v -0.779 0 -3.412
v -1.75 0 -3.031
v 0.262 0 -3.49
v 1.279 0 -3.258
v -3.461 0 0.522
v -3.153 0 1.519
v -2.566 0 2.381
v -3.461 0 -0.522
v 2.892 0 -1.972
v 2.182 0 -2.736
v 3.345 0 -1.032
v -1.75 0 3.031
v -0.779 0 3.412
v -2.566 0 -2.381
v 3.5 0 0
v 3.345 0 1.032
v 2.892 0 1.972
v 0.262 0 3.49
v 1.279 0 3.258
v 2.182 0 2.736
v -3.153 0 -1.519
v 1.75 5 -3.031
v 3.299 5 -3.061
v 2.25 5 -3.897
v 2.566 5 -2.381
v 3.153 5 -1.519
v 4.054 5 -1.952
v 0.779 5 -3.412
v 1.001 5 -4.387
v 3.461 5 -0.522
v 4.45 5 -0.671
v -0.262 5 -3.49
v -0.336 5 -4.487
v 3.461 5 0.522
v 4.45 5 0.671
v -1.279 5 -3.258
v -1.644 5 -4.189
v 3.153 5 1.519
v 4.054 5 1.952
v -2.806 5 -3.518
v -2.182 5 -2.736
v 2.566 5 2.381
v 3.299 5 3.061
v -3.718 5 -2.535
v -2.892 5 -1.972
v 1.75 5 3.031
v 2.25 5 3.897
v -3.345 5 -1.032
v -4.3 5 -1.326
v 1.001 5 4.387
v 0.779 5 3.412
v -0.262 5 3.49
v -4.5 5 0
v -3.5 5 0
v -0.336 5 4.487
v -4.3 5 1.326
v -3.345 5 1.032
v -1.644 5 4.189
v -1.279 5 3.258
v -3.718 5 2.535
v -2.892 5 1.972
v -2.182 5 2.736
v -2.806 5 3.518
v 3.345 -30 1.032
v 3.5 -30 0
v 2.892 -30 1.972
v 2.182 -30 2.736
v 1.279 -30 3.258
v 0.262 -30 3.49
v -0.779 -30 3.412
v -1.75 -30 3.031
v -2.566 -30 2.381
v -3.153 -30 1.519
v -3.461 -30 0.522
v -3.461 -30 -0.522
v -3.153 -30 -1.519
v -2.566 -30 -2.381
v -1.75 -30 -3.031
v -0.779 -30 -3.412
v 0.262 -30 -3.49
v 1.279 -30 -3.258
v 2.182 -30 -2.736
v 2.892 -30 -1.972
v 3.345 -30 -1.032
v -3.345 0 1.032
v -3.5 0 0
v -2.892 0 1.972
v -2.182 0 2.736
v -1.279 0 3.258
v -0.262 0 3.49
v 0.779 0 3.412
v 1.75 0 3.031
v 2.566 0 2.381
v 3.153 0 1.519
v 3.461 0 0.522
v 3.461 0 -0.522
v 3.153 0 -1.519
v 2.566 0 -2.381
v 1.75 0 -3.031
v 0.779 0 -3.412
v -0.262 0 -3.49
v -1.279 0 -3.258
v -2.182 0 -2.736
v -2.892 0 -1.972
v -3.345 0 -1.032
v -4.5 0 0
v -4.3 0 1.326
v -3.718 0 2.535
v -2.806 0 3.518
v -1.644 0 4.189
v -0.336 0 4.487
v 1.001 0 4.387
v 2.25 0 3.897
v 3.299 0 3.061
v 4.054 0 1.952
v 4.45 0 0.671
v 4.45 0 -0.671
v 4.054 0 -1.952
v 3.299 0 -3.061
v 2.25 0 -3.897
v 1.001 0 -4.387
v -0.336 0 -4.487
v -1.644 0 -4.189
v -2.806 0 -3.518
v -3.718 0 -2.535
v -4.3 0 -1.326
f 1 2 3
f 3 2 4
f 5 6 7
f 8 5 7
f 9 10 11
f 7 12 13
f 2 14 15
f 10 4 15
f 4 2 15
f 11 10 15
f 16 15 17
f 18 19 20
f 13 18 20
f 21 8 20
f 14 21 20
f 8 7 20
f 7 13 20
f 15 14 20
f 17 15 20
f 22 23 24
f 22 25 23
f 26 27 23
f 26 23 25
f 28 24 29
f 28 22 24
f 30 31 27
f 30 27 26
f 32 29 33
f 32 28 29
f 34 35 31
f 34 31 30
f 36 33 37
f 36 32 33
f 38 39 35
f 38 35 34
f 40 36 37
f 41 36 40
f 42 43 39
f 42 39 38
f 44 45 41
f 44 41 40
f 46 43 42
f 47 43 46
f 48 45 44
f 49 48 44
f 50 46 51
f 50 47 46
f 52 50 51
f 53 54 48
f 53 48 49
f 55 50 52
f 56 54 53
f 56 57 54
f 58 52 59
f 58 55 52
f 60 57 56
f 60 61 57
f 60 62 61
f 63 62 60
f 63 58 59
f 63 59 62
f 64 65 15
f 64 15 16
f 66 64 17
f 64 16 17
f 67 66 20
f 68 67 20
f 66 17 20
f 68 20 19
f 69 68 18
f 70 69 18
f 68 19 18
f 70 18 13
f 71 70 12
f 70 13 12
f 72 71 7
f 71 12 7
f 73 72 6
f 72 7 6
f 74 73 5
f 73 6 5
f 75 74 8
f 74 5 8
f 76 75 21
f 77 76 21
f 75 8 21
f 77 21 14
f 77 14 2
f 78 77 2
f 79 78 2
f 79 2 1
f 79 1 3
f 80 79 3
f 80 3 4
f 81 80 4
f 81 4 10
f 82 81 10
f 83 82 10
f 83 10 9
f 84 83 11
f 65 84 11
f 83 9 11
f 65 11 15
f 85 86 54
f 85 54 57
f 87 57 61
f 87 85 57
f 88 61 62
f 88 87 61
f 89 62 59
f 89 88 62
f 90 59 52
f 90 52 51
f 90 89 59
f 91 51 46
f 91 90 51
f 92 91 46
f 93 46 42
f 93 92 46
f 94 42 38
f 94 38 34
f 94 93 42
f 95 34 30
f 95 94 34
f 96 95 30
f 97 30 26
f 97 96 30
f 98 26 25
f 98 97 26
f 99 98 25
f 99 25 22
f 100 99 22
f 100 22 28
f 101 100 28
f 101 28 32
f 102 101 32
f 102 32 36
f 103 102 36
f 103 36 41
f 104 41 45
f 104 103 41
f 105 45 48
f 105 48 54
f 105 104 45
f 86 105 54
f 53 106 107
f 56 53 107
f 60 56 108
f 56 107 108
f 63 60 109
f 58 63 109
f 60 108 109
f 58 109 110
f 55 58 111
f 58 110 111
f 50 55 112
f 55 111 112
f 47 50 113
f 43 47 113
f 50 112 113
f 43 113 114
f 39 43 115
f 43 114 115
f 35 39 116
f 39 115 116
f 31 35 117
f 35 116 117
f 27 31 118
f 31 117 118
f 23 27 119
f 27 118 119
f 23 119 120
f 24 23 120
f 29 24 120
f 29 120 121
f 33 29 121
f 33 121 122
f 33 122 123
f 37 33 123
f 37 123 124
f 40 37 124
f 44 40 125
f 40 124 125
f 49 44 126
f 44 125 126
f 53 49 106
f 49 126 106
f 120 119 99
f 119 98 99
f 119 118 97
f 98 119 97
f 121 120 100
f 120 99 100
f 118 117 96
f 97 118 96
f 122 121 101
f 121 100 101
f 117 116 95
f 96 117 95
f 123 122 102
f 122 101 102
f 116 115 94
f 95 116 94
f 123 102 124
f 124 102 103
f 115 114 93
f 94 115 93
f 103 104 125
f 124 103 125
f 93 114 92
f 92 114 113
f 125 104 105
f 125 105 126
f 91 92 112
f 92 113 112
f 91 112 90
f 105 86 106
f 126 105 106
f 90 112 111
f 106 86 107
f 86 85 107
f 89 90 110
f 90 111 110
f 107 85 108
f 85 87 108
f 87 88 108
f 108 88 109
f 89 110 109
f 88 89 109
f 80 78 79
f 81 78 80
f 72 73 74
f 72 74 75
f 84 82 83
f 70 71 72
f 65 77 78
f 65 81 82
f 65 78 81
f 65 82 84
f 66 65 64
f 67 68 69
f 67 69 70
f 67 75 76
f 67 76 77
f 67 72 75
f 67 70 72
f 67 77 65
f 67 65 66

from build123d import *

# Parameters (mm, degrees)
F0_R     = 3.5
F1_DEPTH = 30
F2_R     = 4.5
F2_R_2   = 3.5
F3_DEPTH = 5


with BuildPart() as f1:
    # F0 (on Front) → F1 (new body)
    with BuildSketch(Plane.XZ):
        Circle(F0_R)
    extrude(amount=F1_DEPTH)


with BuildPart() as f3:
    # F2 (on face) → F3 (new body)
    with BuildSketch(Plane(origin=(0, 0, 0), x_dir=(-1, 0, 0), z_dir=(0, 1, 0))):
        Circle(F2_R)
        Circle(F2_R_2, mode=Mode.SUBTRACT)
    extrude(amount=F3_DEPTH)


solid = Compound([f1.part, f3.part])
